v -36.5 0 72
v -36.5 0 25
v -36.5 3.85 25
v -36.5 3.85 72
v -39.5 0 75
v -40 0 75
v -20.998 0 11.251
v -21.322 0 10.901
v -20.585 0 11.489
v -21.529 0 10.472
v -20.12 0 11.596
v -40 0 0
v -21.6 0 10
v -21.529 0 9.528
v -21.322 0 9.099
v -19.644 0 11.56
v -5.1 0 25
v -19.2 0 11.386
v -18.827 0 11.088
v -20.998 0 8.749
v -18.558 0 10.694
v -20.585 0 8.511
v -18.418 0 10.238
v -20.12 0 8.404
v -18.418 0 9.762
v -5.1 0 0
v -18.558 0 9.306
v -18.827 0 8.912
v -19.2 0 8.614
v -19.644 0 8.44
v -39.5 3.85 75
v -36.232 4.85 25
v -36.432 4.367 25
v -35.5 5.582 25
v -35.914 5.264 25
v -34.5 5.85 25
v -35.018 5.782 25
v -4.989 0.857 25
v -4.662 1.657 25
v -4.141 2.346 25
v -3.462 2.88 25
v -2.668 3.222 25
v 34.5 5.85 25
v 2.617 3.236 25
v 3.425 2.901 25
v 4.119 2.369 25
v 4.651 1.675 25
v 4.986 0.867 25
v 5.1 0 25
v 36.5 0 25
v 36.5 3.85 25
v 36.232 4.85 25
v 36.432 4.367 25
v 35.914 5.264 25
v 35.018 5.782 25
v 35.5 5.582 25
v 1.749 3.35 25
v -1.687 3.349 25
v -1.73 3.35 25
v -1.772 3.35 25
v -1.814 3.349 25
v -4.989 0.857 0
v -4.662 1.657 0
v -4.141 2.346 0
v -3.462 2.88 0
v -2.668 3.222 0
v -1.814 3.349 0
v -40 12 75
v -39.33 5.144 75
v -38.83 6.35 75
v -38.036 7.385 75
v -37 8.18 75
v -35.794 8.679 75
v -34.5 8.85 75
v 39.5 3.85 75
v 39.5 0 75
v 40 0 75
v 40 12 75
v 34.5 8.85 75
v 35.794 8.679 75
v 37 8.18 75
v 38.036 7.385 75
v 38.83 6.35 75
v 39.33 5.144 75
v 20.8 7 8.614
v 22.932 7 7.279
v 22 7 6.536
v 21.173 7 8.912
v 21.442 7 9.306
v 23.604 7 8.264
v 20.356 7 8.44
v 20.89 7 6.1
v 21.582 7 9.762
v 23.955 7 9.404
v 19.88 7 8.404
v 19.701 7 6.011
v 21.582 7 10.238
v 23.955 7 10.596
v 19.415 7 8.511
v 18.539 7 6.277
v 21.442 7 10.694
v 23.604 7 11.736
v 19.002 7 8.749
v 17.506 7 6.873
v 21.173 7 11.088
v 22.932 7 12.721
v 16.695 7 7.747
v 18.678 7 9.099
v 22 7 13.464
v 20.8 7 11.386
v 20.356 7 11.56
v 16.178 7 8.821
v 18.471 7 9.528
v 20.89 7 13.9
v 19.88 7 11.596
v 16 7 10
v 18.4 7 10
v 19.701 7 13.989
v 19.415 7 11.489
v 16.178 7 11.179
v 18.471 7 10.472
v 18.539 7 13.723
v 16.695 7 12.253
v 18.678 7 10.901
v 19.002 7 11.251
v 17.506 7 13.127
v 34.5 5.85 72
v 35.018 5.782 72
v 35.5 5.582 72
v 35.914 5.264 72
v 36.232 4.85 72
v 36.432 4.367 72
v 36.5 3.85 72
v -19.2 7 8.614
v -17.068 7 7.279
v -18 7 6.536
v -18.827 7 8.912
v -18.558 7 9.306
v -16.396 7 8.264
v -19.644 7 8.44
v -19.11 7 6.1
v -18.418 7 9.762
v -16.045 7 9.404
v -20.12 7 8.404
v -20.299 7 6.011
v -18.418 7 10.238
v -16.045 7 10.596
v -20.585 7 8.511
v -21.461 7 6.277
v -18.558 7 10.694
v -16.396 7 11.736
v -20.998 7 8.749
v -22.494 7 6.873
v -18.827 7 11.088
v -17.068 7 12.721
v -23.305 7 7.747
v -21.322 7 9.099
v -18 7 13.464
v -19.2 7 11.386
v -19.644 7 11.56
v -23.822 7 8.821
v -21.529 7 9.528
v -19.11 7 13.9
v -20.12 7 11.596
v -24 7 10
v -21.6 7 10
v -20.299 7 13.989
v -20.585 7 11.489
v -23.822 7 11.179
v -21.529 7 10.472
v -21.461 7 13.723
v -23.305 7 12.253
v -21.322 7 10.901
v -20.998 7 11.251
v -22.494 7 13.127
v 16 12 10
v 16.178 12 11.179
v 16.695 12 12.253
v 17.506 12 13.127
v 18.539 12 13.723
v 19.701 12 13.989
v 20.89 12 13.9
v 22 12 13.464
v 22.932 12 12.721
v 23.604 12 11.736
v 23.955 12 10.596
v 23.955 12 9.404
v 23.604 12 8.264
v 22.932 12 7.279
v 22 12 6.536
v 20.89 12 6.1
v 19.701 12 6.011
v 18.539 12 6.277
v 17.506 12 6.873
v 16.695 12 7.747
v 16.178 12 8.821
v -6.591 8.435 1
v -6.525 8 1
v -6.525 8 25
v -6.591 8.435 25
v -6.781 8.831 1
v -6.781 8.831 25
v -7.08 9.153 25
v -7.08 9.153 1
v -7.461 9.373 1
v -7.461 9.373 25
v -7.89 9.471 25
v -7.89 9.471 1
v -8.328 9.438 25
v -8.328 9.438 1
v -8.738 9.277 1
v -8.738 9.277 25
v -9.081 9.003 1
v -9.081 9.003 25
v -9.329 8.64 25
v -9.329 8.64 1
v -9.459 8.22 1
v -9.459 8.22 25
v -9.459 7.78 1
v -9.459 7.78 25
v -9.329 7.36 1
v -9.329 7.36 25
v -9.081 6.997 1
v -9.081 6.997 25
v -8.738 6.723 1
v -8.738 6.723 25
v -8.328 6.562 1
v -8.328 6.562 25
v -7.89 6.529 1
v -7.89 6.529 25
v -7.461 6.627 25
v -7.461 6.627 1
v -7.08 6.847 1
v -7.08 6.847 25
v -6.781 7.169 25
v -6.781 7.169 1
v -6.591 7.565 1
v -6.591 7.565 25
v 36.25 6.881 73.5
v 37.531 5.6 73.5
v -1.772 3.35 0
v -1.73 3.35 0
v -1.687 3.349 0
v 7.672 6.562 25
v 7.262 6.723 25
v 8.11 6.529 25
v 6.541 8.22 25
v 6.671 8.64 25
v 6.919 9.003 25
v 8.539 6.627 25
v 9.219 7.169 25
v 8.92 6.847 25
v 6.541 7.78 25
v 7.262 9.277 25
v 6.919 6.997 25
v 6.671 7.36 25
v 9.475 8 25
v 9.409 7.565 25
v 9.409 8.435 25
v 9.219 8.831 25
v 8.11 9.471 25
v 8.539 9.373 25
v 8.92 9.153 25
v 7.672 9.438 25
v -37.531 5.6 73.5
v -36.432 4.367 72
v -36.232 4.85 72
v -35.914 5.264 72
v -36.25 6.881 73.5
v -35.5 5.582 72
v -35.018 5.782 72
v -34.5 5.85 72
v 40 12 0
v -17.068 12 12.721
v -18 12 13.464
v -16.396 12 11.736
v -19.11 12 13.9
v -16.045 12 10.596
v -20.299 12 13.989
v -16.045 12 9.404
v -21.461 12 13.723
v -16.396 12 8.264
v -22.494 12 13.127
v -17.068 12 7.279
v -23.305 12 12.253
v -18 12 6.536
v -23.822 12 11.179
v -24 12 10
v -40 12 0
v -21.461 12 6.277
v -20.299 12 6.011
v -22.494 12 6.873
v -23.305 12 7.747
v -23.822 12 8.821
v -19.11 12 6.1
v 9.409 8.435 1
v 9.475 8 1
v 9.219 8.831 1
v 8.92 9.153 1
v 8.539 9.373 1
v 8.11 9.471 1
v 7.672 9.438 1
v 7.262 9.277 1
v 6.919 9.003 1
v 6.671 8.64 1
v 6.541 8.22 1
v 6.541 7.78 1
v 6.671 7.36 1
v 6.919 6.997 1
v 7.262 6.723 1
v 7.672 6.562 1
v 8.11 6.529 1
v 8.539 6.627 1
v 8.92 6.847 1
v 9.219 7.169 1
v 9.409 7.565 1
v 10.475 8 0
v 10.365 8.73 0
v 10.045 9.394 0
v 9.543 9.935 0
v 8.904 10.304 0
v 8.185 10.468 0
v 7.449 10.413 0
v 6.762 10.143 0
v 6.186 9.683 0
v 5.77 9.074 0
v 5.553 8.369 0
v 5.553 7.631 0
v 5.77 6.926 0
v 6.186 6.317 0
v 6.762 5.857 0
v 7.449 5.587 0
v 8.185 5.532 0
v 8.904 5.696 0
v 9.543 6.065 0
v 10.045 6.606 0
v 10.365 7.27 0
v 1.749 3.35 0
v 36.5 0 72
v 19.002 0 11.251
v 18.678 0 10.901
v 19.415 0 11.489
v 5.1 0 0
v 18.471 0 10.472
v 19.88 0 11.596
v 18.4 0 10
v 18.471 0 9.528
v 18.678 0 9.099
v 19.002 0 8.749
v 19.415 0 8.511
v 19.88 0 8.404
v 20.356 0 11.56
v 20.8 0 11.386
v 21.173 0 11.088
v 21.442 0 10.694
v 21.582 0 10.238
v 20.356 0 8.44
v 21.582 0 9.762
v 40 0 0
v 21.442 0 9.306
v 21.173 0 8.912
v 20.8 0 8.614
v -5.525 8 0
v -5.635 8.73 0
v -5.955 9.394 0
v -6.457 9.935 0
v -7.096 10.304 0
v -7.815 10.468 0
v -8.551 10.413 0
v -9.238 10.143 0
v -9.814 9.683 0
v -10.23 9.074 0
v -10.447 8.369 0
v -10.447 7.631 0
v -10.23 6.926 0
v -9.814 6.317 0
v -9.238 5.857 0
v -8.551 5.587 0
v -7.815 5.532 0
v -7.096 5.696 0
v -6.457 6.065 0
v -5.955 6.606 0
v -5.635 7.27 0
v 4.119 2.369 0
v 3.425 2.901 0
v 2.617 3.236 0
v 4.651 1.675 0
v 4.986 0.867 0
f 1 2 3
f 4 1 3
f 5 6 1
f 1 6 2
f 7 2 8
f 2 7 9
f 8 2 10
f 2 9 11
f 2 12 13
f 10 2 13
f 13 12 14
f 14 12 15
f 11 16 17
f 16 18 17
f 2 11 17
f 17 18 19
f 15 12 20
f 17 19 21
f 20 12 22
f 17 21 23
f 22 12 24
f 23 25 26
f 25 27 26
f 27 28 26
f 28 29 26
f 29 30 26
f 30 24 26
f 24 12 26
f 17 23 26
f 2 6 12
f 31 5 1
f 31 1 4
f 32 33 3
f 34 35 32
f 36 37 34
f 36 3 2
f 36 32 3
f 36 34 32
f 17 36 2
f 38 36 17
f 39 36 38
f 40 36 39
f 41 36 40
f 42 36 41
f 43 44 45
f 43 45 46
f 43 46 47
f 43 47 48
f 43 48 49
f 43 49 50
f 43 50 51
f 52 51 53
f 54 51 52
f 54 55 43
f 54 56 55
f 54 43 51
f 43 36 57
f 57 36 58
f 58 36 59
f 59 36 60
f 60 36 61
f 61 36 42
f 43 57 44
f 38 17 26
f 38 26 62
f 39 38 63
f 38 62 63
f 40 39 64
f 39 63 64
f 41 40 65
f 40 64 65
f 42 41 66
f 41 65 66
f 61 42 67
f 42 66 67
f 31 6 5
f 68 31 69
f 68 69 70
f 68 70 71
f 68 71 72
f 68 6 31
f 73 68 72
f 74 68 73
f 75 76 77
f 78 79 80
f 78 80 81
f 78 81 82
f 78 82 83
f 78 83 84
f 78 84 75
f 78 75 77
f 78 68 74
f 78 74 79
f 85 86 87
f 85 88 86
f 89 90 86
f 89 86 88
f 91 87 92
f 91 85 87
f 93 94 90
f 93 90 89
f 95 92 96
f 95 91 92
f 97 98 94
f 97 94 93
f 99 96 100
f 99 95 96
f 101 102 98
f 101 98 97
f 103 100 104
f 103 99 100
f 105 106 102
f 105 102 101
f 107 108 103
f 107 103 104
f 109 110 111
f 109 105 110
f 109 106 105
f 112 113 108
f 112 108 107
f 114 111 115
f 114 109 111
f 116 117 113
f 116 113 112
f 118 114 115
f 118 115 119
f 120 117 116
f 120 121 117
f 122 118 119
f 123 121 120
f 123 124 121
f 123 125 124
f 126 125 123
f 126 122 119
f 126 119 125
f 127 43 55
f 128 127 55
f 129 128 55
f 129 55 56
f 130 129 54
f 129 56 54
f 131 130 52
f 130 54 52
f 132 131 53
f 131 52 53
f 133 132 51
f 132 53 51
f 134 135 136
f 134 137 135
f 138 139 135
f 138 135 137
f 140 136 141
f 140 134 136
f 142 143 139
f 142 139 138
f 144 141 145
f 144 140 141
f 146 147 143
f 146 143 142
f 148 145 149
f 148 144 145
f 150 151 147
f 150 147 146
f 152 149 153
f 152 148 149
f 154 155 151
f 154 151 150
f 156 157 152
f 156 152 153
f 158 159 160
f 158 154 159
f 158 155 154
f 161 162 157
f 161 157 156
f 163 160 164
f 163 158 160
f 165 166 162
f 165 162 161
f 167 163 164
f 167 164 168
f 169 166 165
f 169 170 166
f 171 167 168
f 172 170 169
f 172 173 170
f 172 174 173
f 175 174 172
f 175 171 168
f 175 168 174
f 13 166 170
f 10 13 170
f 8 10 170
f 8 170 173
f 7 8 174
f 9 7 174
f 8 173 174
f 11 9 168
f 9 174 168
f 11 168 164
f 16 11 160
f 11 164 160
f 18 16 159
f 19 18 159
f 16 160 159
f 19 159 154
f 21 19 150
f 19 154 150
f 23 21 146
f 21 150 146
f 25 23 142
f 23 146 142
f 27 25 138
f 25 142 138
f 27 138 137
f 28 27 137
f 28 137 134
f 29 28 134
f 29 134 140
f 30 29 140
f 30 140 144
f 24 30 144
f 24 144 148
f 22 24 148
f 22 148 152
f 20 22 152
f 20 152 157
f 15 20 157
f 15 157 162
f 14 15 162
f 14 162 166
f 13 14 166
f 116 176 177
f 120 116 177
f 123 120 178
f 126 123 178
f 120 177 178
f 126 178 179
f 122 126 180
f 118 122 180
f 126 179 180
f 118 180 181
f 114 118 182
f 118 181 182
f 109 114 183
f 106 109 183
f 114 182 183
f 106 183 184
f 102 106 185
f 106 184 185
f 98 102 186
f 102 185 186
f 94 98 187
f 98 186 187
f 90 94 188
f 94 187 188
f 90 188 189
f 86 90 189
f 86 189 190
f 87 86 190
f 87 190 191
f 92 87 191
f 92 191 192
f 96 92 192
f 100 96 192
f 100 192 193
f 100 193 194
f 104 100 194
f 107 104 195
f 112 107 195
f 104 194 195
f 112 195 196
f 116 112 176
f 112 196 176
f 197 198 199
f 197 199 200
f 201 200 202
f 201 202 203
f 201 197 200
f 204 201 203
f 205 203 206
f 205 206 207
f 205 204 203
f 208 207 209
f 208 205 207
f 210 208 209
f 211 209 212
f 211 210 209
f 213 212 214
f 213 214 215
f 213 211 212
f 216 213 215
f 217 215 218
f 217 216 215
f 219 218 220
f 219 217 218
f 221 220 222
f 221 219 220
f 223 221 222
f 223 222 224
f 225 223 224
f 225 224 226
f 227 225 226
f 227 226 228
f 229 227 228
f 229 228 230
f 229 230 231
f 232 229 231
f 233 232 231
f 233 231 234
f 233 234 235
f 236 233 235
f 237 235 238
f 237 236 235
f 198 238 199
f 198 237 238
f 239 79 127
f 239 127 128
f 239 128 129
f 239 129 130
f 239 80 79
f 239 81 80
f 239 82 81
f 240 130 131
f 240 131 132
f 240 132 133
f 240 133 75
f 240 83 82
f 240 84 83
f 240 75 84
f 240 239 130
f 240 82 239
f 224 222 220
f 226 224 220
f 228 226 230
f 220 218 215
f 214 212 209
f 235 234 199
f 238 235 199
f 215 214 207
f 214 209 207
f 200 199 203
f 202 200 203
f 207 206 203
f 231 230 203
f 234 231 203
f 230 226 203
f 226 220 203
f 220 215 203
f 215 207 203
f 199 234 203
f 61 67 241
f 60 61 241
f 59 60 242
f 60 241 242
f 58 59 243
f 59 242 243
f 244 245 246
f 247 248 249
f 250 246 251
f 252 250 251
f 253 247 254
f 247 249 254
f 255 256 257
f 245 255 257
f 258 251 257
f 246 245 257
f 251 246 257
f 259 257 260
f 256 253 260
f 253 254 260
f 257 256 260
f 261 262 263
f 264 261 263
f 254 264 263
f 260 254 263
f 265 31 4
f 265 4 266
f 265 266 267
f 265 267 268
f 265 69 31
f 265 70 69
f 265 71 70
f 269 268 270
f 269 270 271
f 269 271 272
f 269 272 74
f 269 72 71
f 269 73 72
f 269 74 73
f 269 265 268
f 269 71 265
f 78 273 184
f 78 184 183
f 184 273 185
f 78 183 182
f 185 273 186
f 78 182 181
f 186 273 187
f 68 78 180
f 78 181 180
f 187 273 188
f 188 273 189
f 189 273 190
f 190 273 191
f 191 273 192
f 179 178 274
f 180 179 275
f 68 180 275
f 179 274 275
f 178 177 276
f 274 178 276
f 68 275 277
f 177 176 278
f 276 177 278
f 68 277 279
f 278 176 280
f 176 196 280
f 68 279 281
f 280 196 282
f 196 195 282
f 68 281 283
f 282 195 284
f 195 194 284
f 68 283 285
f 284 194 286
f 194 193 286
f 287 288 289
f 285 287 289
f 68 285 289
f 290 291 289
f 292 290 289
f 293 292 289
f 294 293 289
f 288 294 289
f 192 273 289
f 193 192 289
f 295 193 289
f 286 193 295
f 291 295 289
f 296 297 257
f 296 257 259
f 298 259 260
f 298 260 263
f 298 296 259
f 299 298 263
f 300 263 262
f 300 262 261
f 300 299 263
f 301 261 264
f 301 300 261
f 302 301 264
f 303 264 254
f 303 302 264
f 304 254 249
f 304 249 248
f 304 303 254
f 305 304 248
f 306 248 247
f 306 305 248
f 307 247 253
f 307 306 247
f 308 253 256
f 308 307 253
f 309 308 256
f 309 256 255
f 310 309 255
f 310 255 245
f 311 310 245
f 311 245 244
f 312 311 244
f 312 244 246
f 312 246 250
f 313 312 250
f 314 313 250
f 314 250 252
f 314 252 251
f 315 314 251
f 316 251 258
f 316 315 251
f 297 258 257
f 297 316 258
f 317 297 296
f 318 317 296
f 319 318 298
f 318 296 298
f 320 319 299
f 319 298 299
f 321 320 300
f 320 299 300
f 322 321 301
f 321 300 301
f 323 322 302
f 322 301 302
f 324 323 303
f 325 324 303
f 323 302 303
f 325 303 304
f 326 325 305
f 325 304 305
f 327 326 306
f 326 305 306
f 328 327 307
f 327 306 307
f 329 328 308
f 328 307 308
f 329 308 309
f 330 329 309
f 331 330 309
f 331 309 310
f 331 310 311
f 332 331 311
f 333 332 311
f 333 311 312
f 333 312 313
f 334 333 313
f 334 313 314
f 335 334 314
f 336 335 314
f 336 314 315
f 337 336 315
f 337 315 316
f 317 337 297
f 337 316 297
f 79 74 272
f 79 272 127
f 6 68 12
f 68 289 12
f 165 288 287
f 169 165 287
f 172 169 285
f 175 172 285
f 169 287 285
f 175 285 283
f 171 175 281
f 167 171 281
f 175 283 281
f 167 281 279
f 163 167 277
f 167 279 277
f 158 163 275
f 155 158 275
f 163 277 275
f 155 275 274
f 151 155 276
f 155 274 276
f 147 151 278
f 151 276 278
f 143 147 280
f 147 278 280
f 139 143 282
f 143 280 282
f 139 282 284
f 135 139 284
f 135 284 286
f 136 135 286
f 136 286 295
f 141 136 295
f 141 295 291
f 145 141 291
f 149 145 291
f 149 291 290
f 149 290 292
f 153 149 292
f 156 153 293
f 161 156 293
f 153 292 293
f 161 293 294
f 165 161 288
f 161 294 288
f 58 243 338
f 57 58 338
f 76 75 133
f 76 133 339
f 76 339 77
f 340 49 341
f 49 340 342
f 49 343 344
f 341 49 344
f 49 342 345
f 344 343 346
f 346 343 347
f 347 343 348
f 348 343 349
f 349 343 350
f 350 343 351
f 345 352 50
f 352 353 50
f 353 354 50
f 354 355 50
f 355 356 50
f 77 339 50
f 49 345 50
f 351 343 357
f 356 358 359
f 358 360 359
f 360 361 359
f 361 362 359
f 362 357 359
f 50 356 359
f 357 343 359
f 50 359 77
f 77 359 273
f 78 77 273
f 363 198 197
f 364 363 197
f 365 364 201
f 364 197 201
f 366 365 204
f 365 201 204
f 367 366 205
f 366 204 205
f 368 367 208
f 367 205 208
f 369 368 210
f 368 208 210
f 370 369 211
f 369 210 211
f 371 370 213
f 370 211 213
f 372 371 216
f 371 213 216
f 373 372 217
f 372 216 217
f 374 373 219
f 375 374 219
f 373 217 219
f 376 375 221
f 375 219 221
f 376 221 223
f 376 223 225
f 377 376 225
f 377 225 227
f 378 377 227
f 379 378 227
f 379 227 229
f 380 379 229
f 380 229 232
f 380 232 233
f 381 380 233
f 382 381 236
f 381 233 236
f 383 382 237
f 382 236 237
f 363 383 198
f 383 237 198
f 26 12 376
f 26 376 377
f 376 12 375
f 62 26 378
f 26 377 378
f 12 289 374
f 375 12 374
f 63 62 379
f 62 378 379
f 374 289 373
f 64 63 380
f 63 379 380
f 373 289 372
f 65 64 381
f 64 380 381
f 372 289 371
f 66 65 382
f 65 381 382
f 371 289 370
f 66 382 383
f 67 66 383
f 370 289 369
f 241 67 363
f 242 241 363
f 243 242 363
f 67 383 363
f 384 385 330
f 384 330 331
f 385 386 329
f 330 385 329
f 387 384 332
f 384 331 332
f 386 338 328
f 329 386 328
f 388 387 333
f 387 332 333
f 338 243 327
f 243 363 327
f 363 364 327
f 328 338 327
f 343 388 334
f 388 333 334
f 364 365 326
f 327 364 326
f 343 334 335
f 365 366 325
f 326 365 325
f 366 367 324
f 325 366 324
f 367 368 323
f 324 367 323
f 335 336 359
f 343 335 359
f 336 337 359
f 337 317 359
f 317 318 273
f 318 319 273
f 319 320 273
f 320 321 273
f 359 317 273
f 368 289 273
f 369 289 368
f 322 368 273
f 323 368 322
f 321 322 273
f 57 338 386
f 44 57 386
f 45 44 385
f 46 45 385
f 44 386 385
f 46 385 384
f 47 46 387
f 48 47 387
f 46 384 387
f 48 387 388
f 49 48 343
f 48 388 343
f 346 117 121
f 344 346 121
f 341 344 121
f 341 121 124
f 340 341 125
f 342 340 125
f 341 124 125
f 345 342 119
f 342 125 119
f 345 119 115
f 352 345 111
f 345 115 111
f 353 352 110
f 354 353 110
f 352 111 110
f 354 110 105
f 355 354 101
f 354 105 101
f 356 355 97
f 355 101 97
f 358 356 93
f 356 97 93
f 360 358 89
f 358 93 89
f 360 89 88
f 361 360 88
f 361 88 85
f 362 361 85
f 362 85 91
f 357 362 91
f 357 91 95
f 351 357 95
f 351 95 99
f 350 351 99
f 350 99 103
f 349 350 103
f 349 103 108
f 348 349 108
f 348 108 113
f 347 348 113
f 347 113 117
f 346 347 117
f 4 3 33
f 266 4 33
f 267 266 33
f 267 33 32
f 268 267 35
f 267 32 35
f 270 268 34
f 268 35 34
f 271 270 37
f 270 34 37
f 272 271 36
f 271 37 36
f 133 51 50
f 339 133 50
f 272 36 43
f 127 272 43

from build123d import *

# Parameters (mm, degrees)
F0_R     = 1.475
F1_DEPTH = 25
F2_R     = 1.6
F3_DEPTH = 30
F2_R_2   = 4
F4_DEPTH = 5
F5_R     = 1.475
F6_DEPTH = 50
F7_SIZE  = 3
F8_DEPTH = 20
F9_SIZE  = 1


with BuildPart() as f1:
    # F0 (on Top) → F1 (new body)
    with BuildSketch(Plane.XY):
        with BuildLine():
            ThreePointArc((-5.1, 0), (-4.141202, 2.3462), (-1.81364, 3.349395))
            ThreePointArc((-1.81364, 3.349395), (-1.750568, 3.35), (-1.687497, 3.349417))
            Line((-1.687497, 3.349417), (1.749432, 3.35))
            ThreePointArc((1.749432, 3.35), (4.118607, 2.369009), (5.1, 0))
            Line((5.1, 0), (40, 0))
            Line((40, 0), (40, 12))
            Line((40, 12), (-40, 12))
            Line((-40, 12), (-40, 0))
            Line((-40, 0), (-5.1, 0))
        make_face()
        with Locations((-8, 8)):
            Circle(F0_R, mode=Mode.SUBTRACT)
        with Locations((8, 8)):
            Circle(F0_R, mode=Mode.SUBTRACT)
    extrude(amount=F1_DEPTH)

    # F2 (on face) → F3 (cut)
    with BuildSketch(Plane(origin=(0, 12, 0), x_dir=(-1, 0, 0), z_dir=(0, 1, 0))):
        with Locations((-20, 10)):
            Circle(F2_R)
        with Locations((20, 10)):
            Circle(F2_R)
    extrude(amount=-F3_DEPTH, mode=Mode.SUBTRACT)

    # F2 (on face) → F4 (cut)
    with BuildSketch(Plane(origin=(0, 12, 0), x_dir=(-1, 0, 0), z_dir=(0, 1, 0))):
        with Locations((-20, 10)):
            Circle(F2_R_2)
        with Locations((-20, 10)):
            Circle(F2_R, mode=Mode.SUBTRACT)
        with Locations((20, 10)):
            Circle(F2_R_2)
        with Locations((20, 10)):
            Circle(F2_R, mode=Mode.SUBTRACT)
    extrude(amount=-F4_DEPTH, mode=Mode.SUBTRACT)

    # F5 (on face) → F6 (join)
    with BuildSketch(Plane.XY.offset(25)):
        with BuildLine():
            Line((40, 12), (-40, 12))
            Line((-40, 12), (-40, 0))
            Line((-40, 0), (-36.5, 0))
            Line((-36.5, 0), (-36.5, 3.849708))
            ThreePointArc((-36.5, 3.849708), (-35.914214, 5.263922), (-34.5, 5.849708))
            Line((-34.5, 5.849708), (34.5, 5.849708))
            ThreePointArc((34.5, 5.849708), (35.914214, 5.263922), (36.5, 3.849708))
            Line((36.5, 3.849708), (36.5, 0))
            Line((36.5, 0), (40, 0))
            Line((40, 0), (40, 12))
        make_face()
        with Locations((-8, 8)):
            Circle(F5_R, mode=Mode.SUBTRACT)
        with Locations((8, 8)):
            Circle(F5_R, mode=Mode.SUBTRACT)
        with Locations((-8, 8)):
            Circle(F5_R)
        with Locations((8, 8)):
            Circle(F5_R)
    extrude(amount=F6_DEPTH)

    # F7
    f7_edges = [f1.edges().sort_by_distance(p)[0] for p in [
        (0, 5.849708, 75),
    ]]
    chamfer(f7_edges, length=F7_SIZE)

    # F0 (on Top) → F8 (cut)
    with BuildSketch(Plane.XY):
        with Locations((-8, 8)):
            Circle(F0_R)
        with Locations((8, 8)):
            Circle(F0_R)
    extrude(amount=F8_DEPTH, mode=Mode.SUBTRACT)

    # F9
    f9_edges = [f1.edges().sort_by_distance(p)[0] for p in [
        (-9.475, 8, 0),
        (6.525, 8, 0),
    ]]
    chamfer(f9_edges, length=F9_SIZE)


solid = f1.part
